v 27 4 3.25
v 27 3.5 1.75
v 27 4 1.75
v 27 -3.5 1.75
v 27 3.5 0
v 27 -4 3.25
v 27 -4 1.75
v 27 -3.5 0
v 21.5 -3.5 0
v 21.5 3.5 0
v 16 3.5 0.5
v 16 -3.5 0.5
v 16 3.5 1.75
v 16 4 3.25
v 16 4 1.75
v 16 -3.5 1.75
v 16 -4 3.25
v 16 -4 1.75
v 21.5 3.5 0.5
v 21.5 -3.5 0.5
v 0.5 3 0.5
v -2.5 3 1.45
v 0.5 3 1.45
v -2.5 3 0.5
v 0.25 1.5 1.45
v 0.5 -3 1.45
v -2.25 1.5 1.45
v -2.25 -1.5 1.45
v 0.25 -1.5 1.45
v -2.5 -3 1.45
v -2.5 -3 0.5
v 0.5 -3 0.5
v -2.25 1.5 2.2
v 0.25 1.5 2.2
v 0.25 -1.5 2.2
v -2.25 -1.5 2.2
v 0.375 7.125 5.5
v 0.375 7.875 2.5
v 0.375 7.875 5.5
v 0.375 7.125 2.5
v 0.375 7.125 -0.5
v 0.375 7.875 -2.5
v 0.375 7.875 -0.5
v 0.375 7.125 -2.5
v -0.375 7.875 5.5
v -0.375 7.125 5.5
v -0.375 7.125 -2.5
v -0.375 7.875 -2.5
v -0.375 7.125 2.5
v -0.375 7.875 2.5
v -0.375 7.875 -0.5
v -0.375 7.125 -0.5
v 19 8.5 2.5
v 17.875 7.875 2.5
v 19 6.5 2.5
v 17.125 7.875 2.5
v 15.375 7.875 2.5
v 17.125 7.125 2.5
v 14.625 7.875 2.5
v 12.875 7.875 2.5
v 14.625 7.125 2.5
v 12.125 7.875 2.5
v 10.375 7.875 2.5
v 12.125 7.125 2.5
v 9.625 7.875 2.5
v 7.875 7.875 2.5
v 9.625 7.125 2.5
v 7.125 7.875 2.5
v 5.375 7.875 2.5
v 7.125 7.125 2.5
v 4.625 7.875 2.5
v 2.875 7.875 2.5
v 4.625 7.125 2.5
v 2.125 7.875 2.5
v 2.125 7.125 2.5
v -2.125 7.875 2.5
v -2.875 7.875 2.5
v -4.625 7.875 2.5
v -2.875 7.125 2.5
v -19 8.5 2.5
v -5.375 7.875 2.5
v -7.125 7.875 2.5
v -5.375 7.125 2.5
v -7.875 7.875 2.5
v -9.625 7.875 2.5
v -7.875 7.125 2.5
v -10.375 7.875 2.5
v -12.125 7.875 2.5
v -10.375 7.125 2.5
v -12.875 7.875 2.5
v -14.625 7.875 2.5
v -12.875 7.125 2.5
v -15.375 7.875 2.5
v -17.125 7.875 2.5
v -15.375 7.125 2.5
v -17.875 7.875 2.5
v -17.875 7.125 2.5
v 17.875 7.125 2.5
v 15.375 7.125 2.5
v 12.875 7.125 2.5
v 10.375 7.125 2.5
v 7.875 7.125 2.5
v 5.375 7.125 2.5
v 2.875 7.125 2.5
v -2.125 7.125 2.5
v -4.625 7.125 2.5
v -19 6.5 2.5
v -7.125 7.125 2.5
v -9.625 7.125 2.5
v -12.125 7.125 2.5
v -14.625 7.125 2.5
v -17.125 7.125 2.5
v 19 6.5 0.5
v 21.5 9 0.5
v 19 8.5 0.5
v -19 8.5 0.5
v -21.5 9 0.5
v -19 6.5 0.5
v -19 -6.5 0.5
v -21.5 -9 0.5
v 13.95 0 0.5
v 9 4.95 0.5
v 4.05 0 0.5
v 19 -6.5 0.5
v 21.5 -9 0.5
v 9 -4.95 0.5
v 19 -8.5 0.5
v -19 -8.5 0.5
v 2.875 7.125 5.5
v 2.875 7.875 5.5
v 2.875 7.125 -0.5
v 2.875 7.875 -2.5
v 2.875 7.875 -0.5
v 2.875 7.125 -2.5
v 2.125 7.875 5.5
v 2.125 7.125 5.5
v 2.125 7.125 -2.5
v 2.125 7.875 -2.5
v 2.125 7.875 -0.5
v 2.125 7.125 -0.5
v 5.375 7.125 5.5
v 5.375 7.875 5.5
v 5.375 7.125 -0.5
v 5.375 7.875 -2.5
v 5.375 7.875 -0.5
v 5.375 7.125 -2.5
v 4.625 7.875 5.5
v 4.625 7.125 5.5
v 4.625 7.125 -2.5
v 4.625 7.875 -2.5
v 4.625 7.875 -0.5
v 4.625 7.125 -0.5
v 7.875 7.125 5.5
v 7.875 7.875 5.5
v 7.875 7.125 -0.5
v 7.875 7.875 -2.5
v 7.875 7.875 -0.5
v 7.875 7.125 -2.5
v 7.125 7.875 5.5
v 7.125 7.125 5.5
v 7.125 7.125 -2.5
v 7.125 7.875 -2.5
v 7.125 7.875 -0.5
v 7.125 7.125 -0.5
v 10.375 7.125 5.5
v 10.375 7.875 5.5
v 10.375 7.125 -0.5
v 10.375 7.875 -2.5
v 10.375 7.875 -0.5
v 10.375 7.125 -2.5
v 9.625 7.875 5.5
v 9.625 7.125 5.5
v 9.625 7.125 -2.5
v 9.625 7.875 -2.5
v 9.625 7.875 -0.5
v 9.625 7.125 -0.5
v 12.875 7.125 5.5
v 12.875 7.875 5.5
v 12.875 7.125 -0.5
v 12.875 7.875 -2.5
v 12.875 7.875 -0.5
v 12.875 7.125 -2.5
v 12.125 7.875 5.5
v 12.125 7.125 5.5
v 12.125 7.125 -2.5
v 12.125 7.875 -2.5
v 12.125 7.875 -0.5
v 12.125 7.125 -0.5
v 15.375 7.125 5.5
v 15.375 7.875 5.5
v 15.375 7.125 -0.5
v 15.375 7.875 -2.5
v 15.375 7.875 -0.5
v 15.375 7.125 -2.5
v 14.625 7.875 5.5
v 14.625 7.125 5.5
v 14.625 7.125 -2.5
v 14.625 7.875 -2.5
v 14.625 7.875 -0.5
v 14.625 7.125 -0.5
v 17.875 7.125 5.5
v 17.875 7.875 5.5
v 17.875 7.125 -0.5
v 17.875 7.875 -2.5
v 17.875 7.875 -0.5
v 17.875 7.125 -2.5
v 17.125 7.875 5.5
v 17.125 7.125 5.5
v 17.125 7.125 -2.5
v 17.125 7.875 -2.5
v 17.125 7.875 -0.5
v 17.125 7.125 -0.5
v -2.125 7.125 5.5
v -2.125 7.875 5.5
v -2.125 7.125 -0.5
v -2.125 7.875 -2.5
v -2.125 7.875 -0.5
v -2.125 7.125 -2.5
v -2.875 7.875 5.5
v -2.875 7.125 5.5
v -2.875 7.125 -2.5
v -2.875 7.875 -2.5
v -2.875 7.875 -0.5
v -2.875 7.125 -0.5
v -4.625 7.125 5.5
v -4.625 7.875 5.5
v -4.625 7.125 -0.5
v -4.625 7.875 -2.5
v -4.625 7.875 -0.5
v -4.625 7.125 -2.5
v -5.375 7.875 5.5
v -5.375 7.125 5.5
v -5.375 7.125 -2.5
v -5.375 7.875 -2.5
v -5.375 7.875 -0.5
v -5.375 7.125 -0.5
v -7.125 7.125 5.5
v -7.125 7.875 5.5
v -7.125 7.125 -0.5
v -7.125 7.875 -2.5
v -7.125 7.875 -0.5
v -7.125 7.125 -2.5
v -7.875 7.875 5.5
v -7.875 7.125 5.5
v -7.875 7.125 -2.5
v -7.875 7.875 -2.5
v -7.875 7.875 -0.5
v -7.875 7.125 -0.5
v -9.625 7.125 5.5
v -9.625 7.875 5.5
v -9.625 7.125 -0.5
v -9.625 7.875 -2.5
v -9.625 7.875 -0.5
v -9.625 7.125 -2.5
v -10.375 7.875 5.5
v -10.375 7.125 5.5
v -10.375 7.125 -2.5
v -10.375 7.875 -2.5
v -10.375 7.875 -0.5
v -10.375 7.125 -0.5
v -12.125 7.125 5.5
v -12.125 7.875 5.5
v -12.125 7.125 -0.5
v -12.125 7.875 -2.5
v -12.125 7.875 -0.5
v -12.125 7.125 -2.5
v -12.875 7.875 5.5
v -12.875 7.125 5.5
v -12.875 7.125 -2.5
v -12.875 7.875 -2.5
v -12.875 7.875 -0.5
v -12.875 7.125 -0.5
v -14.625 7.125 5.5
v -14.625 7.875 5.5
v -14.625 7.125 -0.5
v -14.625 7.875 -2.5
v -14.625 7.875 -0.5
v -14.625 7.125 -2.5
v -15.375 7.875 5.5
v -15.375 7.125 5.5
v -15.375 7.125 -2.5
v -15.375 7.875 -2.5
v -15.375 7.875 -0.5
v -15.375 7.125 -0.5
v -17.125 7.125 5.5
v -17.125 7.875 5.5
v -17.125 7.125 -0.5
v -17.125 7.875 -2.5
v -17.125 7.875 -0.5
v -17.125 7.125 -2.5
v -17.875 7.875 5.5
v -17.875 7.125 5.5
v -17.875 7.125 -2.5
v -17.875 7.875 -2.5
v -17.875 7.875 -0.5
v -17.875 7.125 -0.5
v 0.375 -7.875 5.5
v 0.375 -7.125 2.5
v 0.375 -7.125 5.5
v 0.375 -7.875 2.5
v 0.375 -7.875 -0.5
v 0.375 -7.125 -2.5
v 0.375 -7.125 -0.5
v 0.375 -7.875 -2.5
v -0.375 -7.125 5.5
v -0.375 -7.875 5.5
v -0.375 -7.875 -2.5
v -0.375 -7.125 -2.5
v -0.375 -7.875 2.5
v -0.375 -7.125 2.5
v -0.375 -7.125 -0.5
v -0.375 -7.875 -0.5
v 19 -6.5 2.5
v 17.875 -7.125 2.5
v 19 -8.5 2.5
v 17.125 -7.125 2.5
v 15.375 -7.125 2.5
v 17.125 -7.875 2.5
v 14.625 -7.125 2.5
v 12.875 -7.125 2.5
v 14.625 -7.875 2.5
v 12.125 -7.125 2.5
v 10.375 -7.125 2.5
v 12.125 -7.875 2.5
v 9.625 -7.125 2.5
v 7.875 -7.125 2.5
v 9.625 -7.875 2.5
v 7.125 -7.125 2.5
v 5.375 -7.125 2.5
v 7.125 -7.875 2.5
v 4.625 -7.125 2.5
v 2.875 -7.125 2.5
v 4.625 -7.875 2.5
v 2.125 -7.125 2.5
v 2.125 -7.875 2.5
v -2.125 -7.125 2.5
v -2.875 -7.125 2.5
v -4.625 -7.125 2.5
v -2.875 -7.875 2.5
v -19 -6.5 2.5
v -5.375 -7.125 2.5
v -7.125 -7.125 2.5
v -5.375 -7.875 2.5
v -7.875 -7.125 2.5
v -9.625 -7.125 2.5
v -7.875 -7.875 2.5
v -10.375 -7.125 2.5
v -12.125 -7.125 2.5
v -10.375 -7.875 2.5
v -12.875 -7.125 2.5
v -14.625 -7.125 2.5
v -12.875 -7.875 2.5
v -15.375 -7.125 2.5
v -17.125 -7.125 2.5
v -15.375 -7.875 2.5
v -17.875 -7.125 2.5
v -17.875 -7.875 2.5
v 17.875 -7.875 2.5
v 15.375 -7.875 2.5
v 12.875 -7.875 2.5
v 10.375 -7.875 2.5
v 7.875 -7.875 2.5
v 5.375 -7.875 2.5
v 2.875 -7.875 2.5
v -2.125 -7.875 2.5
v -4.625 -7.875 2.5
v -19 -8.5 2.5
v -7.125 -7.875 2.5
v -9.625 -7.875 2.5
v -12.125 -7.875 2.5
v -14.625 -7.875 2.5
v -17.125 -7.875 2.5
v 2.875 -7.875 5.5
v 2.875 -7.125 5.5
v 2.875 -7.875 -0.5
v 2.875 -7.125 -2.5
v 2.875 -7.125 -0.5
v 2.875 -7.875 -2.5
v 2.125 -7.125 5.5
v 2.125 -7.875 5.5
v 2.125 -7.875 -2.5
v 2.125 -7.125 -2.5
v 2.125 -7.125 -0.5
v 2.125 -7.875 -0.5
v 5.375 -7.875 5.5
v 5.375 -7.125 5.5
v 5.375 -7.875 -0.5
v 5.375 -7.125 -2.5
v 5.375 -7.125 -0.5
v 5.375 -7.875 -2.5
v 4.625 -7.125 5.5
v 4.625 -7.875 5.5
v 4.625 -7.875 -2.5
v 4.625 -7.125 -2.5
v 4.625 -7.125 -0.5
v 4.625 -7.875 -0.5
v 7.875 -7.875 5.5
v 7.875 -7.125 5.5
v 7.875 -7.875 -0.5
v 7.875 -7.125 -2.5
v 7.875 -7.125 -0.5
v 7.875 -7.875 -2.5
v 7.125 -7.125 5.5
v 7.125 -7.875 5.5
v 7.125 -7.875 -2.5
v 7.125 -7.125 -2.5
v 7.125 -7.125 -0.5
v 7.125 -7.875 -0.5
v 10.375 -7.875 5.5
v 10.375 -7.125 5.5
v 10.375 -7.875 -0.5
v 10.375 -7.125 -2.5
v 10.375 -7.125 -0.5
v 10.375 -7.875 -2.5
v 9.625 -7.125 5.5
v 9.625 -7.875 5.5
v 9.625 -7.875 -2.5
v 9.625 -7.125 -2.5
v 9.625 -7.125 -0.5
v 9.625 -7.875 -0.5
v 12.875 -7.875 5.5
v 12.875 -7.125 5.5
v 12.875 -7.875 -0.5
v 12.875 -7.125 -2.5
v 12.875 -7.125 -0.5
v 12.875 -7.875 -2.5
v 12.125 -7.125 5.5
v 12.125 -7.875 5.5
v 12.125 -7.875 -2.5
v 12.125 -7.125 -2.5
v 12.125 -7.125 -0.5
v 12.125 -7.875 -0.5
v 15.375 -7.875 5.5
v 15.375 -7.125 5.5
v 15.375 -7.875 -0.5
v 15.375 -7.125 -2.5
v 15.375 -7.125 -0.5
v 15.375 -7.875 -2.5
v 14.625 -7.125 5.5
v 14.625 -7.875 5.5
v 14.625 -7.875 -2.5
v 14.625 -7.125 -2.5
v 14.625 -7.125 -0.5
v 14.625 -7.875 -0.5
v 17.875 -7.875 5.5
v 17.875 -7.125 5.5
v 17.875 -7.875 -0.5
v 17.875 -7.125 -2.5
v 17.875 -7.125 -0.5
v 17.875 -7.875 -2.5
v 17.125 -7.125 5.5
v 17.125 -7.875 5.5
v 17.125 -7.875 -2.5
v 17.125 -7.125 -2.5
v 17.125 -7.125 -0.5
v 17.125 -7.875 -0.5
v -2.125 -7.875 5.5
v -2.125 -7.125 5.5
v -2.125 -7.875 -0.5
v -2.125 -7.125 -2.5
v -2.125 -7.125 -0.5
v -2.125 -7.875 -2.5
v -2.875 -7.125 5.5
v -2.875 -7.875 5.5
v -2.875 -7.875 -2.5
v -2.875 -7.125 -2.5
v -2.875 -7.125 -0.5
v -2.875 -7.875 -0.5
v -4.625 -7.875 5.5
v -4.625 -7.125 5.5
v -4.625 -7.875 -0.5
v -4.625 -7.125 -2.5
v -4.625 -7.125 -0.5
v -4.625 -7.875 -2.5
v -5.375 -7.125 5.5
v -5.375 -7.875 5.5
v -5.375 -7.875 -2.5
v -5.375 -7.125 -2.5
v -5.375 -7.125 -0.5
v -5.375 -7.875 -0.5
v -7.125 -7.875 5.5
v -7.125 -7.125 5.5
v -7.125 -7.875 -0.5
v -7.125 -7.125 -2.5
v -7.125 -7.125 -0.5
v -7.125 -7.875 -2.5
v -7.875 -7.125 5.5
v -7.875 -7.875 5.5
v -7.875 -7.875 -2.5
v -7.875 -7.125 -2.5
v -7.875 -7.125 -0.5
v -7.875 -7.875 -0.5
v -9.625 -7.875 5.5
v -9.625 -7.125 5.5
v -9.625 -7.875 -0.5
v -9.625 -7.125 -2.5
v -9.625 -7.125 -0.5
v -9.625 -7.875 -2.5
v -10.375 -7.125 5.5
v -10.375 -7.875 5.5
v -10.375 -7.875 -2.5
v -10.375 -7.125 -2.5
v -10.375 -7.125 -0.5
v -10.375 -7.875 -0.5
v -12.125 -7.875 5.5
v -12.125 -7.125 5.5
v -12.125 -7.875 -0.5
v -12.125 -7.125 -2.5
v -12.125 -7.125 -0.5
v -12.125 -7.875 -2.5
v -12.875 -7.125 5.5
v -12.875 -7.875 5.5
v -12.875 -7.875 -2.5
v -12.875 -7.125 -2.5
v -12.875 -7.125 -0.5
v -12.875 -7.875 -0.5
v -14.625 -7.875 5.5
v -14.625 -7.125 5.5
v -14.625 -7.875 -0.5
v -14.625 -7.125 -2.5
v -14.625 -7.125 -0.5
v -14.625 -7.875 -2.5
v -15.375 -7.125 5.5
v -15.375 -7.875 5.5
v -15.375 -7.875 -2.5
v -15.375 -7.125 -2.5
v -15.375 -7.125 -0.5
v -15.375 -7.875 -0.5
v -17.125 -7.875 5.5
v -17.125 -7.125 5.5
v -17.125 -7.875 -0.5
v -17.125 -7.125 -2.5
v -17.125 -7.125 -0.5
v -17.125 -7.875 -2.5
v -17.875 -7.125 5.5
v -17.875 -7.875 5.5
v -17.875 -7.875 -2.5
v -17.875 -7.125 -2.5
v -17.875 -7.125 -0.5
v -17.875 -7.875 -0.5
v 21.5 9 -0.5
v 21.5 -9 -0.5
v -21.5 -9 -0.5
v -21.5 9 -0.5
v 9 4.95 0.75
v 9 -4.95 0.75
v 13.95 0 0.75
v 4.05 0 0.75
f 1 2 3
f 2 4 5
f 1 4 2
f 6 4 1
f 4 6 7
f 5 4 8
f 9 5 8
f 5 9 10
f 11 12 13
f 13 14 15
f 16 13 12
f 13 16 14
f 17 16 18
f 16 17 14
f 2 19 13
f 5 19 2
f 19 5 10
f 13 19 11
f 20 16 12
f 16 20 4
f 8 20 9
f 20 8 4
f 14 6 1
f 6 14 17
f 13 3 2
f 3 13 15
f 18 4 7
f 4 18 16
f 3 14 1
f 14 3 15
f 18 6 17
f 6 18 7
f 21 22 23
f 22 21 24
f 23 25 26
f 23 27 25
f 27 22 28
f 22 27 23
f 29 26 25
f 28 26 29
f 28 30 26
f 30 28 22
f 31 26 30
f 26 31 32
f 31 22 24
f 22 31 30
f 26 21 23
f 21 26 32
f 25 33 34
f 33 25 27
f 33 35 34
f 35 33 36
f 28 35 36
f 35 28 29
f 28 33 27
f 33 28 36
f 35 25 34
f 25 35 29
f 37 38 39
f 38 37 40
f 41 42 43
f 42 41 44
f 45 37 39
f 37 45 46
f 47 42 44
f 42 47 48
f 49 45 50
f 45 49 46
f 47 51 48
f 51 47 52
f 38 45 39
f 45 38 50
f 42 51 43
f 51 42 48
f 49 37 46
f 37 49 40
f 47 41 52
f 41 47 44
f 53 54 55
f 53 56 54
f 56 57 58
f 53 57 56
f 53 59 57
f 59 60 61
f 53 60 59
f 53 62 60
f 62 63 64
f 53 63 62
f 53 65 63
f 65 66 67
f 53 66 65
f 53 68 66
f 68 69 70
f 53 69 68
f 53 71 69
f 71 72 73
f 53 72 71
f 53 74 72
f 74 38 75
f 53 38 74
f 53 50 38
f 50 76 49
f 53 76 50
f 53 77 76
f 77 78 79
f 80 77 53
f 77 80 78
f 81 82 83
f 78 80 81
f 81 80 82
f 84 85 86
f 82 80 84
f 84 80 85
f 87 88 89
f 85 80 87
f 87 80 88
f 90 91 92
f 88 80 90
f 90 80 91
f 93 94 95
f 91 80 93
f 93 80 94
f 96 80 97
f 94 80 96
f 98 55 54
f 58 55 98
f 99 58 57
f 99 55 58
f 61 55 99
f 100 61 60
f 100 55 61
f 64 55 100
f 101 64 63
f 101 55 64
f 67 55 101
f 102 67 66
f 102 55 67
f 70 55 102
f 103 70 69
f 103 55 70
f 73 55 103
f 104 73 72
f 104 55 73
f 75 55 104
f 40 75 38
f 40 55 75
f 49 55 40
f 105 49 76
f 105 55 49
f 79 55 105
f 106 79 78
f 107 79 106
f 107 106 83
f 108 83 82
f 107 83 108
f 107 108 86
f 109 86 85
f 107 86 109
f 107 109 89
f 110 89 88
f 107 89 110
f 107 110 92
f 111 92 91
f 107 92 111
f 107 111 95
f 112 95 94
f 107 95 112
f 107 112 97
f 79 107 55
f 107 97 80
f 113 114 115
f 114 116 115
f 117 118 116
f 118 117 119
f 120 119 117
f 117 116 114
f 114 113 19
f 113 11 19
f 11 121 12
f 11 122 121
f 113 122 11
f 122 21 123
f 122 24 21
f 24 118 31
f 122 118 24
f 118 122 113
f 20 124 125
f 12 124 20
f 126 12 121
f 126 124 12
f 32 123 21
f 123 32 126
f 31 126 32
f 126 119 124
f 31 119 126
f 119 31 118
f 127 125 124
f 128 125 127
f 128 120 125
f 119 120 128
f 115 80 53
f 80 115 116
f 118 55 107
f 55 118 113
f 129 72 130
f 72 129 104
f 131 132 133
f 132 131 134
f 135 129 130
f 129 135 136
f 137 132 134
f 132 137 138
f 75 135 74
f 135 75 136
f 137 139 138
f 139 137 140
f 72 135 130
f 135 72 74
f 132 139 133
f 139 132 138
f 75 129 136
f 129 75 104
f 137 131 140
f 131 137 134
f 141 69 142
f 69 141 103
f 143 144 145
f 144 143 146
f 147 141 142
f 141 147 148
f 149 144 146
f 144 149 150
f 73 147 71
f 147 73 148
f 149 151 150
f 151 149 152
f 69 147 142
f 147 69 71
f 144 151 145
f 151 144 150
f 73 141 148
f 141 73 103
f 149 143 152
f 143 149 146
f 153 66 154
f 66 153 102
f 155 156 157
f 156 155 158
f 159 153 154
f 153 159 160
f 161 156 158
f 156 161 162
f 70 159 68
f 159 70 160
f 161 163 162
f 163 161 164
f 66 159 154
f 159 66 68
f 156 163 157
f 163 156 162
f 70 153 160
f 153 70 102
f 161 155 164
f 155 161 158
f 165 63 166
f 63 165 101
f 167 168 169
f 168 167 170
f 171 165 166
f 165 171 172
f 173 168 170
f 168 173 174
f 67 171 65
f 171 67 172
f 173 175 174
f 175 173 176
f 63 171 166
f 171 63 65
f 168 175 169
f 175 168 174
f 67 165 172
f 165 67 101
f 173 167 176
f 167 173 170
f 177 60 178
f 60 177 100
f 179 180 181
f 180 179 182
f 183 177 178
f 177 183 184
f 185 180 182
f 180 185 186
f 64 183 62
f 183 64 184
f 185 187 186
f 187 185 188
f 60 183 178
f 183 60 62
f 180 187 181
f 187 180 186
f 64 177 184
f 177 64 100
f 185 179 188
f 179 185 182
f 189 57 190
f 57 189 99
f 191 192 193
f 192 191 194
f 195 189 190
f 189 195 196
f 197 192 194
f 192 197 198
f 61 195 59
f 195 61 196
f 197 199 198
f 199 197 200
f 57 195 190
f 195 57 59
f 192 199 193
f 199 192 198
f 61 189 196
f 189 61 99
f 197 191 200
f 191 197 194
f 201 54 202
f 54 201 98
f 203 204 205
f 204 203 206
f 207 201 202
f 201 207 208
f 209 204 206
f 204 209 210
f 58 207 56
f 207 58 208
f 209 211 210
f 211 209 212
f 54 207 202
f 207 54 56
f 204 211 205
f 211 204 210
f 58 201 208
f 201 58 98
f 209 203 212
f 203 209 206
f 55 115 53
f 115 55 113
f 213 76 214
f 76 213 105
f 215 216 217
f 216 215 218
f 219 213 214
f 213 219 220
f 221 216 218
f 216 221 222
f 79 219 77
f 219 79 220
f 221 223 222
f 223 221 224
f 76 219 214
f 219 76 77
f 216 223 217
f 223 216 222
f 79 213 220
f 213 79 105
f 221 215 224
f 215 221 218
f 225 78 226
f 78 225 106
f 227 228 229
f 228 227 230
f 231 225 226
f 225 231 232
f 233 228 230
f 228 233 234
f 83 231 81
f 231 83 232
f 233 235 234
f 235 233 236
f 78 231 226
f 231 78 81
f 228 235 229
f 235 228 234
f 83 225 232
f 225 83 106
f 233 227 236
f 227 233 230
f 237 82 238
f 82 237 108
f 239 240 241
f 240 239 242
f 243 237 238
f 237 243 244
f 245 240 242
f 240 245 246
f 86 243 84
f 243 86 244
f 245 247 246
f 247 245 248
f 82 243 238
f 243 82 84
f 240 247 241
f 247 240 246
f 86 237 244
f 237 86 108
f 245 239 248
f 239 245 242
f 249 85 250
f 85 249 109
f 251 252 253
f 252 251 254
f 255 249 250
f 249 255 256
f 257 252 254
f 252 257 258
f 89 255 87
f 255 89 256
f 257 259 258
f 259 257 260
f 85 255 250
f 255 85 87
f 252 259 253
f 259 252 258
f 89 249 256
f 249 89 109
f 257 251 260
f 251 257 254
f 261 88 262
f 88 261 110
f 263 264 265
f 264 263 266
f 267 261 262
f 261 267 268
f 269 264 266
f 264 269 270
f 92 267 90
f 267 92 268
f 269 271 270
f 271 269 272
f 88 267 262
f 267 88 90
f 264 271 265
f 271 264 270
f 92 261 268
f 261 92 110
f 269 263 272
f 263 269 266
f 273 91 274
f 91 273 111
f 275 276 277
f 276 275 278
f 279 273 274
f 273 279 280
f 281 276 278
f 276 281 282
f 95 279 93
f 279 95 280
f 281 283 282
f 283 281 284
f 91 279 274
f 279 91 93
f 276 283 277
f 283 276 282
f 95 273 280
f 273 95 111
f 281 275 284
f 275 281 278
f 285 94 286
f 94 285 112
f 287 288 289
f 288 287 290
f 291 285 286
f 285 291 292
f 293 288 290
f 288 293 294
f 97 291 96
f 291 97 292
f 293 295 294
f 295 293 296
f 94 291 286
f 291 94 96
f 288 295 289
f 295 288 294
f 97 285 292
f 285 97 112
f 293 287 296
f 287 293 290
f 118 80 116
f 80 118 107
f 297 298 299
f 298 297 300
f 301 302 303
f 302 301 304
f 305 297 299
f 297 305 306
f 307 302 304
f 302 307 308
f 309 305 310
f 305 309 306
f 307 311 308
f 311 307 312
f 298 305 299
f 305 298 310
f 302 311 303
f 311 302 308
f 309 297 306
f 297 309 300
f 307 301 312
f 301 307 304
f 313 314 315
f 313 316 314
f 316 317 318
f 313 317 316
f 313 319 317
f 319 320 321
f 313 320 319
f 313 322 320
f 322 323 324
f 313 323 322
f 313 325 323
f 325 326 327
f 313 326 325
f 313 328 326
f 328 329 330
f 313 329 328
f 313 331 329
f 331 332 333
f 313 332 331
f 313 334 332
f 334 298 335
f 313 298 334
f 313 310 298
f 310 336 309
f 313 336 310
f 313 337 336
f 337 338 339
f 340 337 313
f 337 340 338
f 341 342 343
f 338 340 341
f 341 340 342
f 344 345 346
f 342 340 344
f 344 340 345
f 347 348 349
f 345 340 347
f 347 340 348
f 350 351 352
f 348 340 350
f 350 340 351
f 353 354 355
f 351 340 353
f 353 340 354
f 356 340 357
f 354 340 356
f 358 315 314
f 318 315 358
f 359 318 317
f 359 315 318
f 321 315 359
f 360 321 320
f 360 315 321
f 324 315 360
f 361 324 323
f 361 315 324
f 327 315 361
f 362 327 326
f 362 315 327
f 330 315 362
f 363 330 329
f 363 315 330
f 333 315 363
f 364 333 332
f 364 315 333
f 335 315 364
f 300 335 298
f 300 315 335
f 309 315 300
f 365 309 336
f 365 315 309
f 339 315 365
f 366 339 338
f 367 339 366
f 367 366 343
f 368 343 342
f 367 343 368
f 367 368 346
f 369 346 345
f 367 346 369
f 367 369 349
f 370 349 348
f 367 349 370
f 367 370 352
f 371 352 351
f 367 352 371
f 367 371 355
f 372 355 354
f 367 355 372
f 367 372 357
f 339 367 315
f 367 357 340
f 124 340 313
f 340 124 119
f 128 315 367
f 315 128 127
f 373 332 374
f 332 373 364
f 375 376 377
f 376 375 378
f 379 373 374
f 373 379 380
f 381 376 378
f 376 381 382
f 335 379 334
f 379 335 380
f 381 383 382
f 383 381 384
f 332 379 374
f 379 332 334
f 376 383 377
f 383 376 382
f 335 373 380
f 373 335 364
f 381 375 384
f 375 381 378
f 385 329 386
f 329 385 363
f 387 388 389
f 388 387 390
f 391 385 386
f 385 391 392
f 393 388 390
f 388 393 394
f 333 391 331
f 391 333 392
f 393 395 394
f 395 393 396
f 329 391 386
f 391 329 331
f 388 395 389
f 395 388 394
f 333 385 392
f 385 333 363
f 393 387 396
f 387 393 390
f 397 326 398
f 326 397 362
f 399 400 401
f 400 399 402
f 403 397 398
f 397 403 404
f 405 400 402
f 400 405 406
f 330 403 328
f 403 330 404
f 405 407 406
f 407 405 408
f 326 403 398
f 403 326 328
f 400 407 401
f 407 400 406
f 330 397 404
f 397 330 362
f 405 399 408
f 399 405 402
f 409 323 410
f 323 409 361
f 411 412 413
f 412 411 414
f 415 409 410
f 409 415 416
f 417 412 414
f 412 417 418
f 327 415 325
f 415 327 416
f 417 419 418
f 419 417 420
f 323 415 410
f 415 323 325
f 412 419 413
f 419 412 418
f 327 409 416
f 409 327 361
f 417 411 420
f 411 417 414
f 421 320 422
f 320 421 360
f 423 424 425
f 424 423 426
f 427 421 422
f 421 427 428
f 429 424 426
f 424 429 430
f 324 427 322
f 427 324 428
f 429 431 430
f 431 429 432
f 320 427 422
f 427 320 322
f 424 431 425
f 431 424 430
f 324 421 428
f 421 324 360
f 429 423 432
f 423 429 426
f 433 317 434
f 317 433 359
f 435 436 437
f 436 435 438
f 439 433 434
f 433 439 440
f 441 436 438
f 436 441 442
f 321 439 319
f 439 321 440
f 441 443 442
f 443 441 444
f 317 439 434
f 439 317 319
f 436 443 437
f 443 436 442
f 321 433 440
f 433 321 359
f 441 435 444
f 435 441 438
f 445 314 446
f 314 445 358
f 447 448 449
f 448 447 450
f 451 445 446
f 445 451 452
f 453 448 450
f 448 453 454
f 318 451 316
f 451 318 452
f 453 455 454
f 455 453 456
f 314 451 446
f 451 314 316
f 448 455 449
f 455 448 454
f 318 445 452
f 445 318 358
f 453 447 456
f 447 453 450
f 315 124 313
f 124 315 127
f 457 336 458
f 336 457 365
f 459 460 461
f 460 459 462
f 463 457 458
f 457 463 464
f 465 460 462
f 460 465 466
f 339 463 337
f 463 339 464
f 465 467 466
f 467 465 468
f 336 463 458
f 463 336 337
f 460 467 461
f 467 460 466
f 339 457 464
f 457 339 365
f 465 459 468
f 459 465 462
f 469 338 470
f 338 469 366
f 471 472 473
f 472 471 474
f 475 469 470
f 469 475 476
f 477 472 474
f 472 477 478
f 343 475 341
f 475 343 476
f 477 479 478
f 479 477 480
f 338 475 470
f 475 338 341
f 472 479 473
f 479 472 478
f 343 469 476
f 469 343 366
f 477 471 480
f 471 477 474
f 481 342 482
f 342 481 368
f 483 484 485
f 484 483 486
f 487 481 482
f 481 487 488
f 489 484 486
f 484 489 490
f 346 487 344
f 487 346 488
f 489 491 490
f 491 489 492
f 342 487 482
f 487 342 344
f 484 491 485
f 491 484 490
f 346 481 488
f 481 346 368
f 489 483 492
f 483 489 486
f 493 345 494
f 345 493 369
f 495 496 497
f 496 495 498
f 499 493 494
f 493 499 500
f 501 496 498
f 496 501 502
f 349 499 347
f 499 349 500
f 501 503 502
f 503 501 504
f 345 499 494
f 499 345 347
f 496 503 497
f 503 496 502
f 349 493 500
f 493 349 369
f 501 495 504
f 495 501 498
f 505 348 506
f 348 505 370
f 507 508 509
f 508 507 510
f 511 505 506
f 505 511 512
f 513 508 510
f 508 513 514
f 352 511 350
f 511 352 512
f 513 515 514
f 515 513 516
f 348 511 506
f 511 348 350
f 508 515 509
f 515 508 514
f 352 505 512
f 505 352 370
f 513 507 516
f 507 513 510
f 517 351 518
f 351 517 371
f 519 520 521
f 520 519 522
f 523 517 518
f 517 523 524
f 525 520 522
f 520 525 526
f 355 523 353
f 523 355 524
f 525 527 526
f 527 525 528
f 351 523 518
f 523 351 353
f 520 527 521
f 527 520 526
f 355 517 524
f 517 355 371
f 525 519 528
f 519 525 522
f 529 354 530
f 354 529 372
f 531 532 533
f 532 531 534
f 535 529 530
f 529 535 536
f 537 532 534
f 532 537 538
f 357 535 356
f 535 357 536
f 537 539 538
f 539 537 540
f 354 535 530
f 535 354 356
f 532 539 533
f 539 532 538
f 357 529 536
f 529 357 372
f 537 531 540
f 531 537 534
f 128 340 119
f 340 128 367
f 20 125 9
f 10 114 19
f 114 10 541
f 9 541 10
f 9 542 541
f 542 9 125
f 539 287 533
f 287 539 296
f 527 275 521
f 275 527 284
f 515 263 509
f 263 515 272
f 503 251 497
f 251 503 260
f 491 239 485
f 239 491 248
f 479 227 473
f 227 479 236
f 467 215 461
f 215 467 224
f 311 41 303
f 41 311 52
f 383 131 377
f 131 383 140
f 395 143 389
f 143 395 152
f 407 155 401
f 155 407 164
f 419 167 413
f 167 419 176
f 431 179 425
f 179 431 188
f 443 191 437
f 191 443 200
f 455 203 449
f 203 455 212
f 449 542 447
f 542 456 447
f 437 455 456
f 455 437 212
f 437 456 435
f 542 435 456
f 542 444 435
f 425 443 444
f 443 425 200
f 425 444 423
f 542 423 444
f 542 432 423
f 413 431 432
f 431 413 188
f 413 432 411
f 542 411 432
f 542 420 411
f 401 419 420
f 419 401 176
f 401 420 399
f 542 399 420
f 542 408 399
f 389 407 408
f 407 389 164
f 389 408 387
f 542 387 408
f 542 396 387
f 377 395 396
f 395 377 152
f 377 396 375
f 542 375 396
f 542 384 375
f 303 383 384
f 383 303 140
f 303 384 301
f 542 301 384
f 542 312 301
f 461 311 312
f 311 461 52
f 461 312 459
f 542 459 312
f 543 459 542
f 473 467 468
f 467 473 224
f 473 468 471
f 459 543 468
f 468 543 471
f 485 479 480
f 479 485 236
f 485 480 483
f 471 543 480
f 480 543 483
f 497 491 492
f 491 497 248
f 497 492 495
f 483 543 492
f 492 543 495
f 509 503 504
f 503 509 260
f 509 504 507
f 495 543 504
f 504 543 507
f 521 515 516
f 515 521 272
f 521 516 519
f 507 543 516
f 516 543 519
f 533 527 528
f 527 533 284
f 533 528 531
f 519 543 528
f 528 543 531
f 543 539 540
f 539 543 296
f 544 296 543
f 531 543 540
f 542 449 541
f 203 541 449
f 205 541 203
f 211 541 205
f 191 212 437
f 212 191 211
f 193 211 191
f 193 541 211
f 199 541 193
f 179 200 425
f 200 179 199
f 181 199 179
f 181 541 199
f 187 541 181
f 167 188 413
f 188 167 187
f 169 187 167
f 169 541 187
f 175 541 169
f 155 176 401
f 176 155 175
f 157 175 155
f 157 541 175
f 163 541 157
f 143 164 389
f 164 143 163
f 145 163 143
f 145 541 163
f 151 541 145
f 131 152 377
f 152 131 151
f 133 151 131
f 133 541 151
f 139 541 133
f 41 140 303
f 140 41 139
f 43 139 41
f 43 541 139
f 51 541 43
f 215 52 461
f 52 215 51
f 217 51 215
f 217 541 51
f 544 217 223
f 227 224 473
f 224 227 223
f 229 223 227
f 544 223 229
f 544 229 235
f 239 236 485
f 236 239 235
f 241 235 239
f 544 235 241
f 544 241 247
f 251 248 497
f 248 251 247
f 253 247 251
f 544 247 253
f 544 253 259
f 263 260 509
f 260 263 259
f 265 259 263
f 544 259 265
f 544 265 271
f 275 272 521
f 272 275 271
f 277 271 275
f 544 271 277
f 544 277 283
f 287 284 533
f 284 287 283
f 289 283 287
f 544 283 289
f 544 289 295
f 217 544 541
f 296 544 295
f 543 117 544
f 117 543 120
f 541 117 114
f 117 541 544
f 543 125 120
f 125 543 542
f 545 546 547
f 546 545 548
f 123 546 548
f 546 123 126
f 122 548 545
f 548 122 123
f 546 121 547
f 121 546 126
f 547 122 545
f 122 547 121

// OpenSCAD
hore = 0; //ci budu piny napajkovane smerom hore alebo dole
module doska(){
color( "MediumBlue", 1.0 )
 cube([43,18,1], true);
}

module connector(){
     cube([11,7,2], true);
     translate([0,0,1.5])
      cube([11,8,1.5], true);
}
module ATMega(){
    color( "Black", 1.0 )
     cube([7,7,0.5], true);
}
module reset(){
    color( "Silver", 1.0 )
    cube([6,3,1.5], true);
    translate([0,0,1])
    color( "White", 1.0 )
     cube([3,2.5,1], true);
}
module pin(){
   color( "Silver", 1.0 )
    cube([0.75,0.75,8], true); 
   color( "Black", 1.0 )
    cube([3,2,2], true); 
}

module pinyl(){
for (i = [0:7])
{
    translate([i*2.5,7.5,1.5])
     pin();
} 

for (i = [0:7])
{
    translate([-(i*2.5),7.5,1.5])
     pin();
} 
}

module pinyp(){
for (i = [0:7])
{
    translate([i*2.5,-7.5,1.5])
     pin();
} 

for (i = [0:7])
{
    translate([-(i*2.5),-7.5,1.5])
     pin();
} 
}


module celok(){
doska();
    
translate([21.5,0,1])
connector();
    
translate([9,0,0.5])
rotate([0,0,45])
ATMega();
    
translate([-1,0,0.7])
rotate([0,0,90])
reset();


pinyl();
pinyp();
}
celok();
